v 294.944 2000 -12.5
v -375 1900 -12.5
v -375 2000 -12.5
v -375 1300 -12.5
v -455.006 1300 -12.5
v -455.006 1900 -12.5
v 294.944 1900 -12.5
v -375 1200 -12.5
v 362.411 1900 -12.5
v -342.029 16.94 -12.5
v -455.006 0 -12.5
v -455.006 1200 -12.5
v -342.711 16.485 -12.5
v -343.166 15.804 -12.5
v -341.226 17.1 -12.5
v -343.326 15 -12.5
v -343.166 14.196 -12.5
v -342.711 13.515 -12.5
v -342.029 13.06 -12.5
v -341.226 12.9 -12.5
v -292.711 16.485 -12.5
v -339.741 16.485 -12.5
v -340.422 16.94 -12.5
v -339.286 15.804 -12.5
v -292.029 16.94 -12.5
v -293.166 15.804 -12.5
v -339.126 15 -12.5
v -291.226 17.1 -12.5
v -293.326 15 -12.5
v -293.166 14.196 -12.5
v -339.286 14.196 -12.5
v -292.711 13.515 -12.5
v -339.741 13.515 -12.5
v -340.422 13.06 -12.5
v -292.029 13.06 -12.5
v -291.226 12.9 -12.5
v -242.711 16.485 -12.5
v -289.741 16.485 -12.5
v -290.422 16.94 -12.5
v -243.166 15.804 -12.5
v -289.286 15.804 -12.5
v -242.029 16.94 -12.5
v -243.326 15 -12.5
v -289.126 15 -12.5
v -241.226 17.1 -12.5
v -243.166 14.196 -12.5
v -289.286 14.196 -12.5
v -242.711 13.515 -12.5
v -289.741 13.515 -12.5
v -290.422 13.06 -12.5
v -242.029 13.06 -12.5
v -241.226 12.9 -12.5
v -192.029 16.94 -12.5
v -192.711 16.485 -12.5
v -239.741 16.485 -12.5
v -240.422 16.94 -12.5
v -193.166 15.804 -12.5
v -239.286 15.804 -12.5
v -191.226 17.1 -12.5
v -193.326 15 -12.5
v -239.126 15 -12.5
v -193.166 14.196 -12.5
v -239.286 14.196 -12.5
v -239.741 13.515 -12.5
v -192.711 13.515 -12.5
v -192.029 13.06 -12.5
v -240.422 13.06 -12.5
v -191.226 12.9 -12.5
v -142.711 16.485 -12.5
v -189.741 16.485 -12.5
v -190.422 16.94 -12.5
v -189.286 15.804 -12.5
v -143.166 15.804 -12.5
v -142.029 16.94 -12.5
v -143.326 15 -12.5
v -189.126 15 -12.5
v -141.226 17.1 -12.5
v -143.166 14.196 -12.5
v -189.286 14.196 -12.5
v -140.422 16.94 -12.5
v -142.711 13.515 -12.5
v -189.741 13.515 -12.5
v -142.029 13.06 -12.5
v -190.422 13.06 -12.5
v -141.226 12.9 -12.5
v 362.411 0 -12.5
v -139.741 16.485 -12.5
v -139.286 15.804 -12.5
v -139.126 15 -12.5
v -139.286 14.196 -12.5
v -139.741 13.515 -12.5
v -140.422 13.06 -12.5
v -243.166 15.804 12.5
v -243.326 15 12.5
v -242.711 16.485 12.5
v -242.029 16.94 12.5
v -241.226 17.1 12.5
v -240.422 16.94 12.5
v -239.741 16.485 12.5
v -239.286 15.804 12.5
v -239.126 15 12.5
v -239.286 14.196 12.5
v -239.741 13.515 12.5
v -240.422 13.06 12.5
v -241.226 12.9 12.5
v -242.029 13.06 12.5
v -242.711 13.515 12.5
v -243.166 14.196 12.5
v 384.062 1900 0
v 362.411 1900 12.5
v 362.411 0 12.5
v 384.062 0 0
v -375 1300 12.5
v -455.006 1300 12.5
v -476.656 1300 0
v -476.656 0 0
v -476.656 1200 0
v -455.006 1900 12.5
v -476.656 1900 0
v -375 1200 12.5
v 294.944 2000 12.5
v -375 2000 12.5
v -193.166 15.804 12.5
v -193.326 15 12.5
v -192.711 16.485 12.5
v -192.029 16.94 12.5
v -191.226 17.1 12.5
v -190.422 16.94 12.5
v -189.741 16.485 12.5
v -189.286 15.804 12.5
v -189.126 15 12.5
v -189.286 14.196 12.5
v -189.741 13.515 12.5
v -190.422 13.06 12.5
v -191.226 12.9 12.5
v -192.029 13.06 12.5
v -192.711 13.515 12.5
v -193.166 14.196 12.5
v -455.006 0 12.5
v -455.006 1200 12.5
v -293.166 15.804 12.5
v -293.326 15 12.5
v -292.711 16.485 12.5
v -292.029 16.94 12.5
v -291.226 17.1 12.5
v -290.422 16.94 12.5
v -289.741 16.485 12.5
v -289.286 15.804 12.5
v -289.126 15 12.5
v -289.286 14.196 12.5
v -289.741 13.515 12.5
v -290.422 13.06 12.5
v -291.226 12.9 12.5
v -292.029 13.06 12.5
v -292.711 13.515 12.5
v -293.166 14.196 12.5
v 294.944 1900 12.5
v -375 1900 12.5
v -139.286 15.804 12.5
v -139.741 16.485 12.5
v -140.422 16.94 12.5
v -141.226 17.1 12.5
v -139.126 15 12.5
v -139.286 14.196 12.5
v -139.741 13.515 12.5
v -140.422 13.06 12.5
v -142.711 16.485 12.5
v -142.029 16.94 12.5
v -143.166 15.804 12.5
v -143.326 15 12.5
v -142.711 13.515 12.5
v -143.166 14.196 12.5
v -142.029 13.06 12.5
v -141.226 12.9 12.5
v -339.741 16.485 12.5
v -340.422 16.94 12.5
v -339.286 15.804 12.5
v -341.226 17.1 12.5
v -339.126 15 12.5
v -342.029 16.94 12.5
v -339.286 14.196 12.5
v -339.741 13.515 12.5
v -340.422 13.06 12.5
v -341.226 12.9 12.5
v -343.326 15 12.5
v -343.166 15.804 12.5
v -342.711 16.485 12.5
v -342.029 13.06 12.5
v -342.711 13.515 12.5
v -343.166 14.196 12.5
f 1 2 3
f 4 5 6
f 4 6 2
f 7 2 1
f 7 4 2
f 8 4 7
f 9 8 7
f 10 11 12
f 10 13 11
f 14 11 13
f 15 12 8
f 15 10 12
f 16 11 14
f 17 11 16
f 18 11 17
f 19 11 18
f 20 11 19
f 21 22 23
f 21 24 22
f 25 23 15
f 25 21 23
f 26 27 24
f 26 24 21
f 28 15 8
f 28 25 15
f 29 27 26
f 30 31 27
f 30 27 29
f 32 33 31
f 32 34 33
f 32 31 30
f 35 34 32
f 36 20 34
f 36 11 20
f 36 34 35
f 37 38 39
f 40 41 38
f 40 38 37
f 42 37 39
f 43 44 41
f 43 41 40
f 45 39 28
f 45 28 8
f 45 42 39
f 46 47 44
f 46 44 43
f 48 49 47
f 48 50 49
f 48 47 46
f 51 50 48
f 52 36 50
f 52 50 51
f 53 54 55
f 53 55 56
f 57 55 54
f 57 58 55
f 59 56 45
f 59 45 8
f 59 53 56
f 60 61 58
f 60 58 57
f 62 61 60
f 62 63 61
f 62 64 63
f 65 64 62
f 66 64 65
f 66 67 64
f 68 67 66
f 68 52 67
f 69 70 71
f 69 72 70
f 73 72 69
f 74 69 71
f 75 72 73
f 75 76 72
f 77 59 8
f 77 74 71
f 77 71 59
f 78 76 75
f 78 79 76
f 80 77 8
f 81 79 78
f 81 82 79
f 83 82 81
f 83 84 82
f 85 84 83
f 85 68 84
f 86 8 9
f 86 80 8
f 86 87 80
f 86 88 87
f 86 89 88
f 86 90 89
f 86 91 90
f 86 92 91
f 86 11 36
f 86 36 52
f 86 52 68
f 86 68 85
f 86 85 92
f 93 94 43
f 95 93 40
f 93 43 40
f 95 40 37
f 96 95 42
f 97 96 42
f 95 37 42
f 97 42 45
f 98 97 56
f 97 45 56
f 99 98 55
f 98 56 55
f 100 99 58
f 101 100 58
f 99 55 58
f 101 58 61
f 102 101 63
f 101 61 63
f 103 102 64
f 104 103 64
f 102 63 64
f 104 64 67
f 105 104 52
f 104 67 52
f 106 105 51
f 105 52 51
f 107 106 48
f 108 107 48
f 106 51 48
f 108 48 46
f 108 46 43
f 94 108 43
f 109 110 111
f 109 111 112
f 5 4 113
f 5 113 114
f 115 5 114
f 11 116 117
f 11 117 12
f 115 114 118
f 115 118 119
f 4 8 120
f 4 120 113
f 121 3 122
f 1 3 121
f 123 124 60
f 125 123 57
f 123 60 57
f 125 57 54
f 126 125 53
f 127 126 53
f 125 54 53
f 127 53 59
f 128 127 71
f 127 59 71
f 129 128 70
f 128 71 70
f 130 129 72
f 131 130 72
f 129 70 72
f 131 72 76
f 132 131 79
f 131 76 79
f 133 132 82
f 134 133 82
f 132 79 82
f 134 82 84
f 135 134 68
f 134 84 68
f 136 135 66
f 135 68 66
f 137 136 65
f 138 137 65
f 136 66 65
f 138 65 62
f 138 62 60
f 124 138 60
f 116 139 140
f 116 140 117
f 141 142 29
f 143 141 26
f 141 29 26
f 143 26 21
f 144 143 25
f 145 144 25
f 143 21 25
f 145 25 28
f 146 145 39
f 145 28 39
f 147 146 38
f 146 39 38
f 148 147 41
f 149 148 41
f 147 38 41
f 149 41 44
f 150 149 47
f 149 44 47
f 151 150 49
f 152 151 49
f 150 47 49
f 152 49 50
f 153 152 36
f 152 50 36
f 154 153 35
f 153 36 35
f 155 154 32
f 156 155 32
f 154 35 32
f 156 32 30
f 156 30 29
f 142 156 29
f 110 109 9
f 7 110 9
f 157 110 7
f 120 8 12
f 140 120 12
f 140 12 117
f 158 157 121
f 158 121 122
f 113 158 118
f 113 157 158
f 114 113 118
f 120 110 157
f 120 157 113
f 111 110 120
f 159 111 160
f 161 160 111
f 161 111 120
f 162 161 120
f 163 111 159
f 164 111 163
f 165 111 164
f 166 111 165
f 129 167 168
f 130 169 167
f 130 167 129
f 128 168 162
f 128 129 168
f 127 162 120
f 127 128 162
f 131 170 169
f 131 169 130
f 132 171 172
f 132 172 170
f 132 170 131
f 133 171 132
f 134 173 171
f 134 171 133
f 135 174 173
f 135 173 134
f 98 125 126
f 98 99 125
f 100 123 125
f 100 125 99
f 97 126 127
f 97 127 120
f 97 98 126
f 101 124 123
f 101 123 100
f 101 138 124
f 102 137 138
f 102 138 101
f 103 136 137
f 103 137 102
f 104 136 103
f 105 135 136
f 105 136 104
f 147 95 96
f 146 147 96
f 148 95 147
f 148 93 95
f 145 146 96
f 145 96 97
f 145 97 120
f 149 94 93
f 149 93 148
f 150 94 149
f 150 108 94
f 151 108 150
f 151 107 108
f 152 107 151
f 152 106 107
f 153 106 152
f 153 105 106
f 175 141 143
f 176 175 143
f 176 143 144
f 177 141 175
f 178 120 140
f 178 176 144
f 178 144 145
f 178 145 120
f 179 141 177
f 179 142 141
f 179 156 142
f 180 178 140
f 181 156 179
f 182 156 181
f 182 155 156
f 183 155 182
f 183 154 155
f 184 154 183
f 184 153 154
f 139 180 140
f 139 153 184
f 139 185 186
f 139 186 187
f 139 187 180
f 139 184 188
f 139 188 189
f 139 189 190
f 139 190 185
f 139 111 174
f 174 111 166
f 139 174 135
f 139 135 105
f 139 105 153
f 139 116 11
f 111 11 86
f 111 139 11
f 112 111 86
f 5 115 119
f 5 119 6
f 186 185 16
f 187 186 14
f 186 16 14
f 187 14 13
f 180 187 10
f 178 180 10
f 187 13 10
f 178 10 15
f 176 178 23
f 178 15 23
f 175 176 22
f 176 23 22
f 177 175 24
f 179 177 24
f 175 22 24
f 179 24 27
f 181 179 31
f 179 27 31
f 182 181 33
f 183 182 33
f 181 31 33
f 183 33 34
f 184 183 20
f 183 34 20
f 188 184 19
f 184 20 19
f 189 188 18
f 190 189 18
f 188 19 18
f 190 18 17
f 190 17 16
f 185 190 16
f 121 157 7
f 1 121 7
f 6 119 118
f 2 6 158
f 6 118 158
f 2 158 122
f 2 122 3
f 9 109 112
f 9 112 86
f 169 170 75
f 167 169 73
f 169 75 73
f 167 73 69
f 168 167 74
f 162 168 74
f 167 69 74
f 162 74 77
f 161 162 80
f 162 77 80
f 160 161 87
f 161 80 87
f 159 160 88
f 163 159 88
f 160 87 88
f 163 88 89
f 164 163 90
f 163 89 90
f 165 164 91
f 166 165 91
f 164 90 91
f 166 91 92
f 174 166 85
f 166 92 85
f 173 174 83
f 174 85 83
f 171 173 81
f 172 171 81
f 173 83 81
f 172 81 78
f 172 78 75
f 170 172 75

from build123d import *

# Parameters (mm, degrees)
SKETCH_1_W             = 669.944195316
SKETCH_1_H             = 25
EXTRUDE_1_DEPTH        = 2000
EXTRUDE_2_DEPTH        = 1900
EXTRUDE_3_DEPTH        = 1900
CUT_EXTRUDE_1_REACH    = 2058.168
SKETCH_5_W             = 21.650635094
SKETCH_5_H             = 100
SKETCH_5_W_2           = 80.005810729
HOLE_WIZARD_M5_2_D     = 4.2
PATTERN_LINEAR_2_COUNT = 5
PATTERN_LINEAR_2_PITCH = 50


with BuildPart() as part:
    # 草图1 → 凸台-拉伸1 (new body)
    with BuildSketch(Plane(origin=(0, 0, 0), x_dir=(1, 0, 0), z_dir=(0, 1, 0))):
        with Locations((-40.027902342, 0)):
            Rectangle(SKETCH_1_W, SKETCH_1_H)
    extrude(amount=EXTRUDE_1_DEPTH)

    # 草图2 → 凸台-拉伸2 (add)
    with BuildSketch(Plane.XZ):
        Polygon((294.944195316, 12.5), (362.411238515, 12.5), (384.061873609, 0), (362.411238515, -12.5), (294.944195316, -12.5), align=None)
    extrude(amount=-EXTRUDE_2_DEPTH)

    # 草图3 → 凸台-拉伸3 (add)
    with BuildSketch(Plane.XZ):
        Polygon((-375, 12.5), (-455.005810729, 12.5), (-476.656445823, 0), (-455.005810729, -12.5), (-375, -12.5), align=None)
    extrude(amount=-EXTRUDE_3_DEPTH)

    # 草图5 → 切除-拉伸1 (cut, up to next)
    with BuildSketch(Plane(origin=(0, 0, -12.5), x_dir=(-1, 0, 0), z_dir=(0, 0, -1)), mode=Mode.PRIVATE) as cut_extrude_1_sk1:
        with Locations((465.831128276, 1250)):
            Rectangle(SKETCH_5_W, SKETCH_5_H)
    cut_extrude_1_tool1 = extrude(cut_extrude_1_sk1.sketch, amount=-CUT_EXTRUDE_1_REACH, mode=Mode.PRIVATE) & part.part
    # 草图5 → 切除-拉伸1 (cut, up to next)
    with BuildSketch(Plane(origin=(0, 0, -12.5), x_dir=(-1, 0, 0), z_dir=(0, 0, -1)), mode=Mode.PRIVATE) as cut_extrude_1_sk2:
        with Locations((415.002905365, 1250)):
            Rectangle(SKETCH_5_W_2, SKETCH_5_H)
    cut_extrude_1_tool2 = extrude(cut_extrude_1_sk2.sketch, amount=-CUT_EXTRUDE_1_REACH, mode=Mode.PRIVATE) & part.part
    add(cut_extrude_1_tool1.solids().sort_by_distance((-465.831128, 1250, -12.5))[0], mode=Mode.SUBTRACT)
    add(cut_extrude_1_tool2.solids().sort_by_distance((-415.002905, 1250, -12.5))[0], mode=Mode.SUBTRACT)

    # M5 螺纹孔2 (through all)
    with Locations(Plane(origin=(-341.225810729, 15, 12.5), x_dir=(1, 0, 0), z_dir=(0, 0, 1))):
        with Locations((0, 0)):
            hole_wizard_m5_2 = Hole(HOLE_WIZARD_M5_2_D / 2)

    # 阵列(线性)2: M5 螺纹孔2 ×5
    with Locations(*[(i * PATTERN_LINEAR_2_PITCH, 0, 0) for i in range(1, PATTERN_LINEAR_2_COUNT)]):
        add(hole_wizard_m5_2, mode=Mode.SUBTRACT)


solid = part.part
